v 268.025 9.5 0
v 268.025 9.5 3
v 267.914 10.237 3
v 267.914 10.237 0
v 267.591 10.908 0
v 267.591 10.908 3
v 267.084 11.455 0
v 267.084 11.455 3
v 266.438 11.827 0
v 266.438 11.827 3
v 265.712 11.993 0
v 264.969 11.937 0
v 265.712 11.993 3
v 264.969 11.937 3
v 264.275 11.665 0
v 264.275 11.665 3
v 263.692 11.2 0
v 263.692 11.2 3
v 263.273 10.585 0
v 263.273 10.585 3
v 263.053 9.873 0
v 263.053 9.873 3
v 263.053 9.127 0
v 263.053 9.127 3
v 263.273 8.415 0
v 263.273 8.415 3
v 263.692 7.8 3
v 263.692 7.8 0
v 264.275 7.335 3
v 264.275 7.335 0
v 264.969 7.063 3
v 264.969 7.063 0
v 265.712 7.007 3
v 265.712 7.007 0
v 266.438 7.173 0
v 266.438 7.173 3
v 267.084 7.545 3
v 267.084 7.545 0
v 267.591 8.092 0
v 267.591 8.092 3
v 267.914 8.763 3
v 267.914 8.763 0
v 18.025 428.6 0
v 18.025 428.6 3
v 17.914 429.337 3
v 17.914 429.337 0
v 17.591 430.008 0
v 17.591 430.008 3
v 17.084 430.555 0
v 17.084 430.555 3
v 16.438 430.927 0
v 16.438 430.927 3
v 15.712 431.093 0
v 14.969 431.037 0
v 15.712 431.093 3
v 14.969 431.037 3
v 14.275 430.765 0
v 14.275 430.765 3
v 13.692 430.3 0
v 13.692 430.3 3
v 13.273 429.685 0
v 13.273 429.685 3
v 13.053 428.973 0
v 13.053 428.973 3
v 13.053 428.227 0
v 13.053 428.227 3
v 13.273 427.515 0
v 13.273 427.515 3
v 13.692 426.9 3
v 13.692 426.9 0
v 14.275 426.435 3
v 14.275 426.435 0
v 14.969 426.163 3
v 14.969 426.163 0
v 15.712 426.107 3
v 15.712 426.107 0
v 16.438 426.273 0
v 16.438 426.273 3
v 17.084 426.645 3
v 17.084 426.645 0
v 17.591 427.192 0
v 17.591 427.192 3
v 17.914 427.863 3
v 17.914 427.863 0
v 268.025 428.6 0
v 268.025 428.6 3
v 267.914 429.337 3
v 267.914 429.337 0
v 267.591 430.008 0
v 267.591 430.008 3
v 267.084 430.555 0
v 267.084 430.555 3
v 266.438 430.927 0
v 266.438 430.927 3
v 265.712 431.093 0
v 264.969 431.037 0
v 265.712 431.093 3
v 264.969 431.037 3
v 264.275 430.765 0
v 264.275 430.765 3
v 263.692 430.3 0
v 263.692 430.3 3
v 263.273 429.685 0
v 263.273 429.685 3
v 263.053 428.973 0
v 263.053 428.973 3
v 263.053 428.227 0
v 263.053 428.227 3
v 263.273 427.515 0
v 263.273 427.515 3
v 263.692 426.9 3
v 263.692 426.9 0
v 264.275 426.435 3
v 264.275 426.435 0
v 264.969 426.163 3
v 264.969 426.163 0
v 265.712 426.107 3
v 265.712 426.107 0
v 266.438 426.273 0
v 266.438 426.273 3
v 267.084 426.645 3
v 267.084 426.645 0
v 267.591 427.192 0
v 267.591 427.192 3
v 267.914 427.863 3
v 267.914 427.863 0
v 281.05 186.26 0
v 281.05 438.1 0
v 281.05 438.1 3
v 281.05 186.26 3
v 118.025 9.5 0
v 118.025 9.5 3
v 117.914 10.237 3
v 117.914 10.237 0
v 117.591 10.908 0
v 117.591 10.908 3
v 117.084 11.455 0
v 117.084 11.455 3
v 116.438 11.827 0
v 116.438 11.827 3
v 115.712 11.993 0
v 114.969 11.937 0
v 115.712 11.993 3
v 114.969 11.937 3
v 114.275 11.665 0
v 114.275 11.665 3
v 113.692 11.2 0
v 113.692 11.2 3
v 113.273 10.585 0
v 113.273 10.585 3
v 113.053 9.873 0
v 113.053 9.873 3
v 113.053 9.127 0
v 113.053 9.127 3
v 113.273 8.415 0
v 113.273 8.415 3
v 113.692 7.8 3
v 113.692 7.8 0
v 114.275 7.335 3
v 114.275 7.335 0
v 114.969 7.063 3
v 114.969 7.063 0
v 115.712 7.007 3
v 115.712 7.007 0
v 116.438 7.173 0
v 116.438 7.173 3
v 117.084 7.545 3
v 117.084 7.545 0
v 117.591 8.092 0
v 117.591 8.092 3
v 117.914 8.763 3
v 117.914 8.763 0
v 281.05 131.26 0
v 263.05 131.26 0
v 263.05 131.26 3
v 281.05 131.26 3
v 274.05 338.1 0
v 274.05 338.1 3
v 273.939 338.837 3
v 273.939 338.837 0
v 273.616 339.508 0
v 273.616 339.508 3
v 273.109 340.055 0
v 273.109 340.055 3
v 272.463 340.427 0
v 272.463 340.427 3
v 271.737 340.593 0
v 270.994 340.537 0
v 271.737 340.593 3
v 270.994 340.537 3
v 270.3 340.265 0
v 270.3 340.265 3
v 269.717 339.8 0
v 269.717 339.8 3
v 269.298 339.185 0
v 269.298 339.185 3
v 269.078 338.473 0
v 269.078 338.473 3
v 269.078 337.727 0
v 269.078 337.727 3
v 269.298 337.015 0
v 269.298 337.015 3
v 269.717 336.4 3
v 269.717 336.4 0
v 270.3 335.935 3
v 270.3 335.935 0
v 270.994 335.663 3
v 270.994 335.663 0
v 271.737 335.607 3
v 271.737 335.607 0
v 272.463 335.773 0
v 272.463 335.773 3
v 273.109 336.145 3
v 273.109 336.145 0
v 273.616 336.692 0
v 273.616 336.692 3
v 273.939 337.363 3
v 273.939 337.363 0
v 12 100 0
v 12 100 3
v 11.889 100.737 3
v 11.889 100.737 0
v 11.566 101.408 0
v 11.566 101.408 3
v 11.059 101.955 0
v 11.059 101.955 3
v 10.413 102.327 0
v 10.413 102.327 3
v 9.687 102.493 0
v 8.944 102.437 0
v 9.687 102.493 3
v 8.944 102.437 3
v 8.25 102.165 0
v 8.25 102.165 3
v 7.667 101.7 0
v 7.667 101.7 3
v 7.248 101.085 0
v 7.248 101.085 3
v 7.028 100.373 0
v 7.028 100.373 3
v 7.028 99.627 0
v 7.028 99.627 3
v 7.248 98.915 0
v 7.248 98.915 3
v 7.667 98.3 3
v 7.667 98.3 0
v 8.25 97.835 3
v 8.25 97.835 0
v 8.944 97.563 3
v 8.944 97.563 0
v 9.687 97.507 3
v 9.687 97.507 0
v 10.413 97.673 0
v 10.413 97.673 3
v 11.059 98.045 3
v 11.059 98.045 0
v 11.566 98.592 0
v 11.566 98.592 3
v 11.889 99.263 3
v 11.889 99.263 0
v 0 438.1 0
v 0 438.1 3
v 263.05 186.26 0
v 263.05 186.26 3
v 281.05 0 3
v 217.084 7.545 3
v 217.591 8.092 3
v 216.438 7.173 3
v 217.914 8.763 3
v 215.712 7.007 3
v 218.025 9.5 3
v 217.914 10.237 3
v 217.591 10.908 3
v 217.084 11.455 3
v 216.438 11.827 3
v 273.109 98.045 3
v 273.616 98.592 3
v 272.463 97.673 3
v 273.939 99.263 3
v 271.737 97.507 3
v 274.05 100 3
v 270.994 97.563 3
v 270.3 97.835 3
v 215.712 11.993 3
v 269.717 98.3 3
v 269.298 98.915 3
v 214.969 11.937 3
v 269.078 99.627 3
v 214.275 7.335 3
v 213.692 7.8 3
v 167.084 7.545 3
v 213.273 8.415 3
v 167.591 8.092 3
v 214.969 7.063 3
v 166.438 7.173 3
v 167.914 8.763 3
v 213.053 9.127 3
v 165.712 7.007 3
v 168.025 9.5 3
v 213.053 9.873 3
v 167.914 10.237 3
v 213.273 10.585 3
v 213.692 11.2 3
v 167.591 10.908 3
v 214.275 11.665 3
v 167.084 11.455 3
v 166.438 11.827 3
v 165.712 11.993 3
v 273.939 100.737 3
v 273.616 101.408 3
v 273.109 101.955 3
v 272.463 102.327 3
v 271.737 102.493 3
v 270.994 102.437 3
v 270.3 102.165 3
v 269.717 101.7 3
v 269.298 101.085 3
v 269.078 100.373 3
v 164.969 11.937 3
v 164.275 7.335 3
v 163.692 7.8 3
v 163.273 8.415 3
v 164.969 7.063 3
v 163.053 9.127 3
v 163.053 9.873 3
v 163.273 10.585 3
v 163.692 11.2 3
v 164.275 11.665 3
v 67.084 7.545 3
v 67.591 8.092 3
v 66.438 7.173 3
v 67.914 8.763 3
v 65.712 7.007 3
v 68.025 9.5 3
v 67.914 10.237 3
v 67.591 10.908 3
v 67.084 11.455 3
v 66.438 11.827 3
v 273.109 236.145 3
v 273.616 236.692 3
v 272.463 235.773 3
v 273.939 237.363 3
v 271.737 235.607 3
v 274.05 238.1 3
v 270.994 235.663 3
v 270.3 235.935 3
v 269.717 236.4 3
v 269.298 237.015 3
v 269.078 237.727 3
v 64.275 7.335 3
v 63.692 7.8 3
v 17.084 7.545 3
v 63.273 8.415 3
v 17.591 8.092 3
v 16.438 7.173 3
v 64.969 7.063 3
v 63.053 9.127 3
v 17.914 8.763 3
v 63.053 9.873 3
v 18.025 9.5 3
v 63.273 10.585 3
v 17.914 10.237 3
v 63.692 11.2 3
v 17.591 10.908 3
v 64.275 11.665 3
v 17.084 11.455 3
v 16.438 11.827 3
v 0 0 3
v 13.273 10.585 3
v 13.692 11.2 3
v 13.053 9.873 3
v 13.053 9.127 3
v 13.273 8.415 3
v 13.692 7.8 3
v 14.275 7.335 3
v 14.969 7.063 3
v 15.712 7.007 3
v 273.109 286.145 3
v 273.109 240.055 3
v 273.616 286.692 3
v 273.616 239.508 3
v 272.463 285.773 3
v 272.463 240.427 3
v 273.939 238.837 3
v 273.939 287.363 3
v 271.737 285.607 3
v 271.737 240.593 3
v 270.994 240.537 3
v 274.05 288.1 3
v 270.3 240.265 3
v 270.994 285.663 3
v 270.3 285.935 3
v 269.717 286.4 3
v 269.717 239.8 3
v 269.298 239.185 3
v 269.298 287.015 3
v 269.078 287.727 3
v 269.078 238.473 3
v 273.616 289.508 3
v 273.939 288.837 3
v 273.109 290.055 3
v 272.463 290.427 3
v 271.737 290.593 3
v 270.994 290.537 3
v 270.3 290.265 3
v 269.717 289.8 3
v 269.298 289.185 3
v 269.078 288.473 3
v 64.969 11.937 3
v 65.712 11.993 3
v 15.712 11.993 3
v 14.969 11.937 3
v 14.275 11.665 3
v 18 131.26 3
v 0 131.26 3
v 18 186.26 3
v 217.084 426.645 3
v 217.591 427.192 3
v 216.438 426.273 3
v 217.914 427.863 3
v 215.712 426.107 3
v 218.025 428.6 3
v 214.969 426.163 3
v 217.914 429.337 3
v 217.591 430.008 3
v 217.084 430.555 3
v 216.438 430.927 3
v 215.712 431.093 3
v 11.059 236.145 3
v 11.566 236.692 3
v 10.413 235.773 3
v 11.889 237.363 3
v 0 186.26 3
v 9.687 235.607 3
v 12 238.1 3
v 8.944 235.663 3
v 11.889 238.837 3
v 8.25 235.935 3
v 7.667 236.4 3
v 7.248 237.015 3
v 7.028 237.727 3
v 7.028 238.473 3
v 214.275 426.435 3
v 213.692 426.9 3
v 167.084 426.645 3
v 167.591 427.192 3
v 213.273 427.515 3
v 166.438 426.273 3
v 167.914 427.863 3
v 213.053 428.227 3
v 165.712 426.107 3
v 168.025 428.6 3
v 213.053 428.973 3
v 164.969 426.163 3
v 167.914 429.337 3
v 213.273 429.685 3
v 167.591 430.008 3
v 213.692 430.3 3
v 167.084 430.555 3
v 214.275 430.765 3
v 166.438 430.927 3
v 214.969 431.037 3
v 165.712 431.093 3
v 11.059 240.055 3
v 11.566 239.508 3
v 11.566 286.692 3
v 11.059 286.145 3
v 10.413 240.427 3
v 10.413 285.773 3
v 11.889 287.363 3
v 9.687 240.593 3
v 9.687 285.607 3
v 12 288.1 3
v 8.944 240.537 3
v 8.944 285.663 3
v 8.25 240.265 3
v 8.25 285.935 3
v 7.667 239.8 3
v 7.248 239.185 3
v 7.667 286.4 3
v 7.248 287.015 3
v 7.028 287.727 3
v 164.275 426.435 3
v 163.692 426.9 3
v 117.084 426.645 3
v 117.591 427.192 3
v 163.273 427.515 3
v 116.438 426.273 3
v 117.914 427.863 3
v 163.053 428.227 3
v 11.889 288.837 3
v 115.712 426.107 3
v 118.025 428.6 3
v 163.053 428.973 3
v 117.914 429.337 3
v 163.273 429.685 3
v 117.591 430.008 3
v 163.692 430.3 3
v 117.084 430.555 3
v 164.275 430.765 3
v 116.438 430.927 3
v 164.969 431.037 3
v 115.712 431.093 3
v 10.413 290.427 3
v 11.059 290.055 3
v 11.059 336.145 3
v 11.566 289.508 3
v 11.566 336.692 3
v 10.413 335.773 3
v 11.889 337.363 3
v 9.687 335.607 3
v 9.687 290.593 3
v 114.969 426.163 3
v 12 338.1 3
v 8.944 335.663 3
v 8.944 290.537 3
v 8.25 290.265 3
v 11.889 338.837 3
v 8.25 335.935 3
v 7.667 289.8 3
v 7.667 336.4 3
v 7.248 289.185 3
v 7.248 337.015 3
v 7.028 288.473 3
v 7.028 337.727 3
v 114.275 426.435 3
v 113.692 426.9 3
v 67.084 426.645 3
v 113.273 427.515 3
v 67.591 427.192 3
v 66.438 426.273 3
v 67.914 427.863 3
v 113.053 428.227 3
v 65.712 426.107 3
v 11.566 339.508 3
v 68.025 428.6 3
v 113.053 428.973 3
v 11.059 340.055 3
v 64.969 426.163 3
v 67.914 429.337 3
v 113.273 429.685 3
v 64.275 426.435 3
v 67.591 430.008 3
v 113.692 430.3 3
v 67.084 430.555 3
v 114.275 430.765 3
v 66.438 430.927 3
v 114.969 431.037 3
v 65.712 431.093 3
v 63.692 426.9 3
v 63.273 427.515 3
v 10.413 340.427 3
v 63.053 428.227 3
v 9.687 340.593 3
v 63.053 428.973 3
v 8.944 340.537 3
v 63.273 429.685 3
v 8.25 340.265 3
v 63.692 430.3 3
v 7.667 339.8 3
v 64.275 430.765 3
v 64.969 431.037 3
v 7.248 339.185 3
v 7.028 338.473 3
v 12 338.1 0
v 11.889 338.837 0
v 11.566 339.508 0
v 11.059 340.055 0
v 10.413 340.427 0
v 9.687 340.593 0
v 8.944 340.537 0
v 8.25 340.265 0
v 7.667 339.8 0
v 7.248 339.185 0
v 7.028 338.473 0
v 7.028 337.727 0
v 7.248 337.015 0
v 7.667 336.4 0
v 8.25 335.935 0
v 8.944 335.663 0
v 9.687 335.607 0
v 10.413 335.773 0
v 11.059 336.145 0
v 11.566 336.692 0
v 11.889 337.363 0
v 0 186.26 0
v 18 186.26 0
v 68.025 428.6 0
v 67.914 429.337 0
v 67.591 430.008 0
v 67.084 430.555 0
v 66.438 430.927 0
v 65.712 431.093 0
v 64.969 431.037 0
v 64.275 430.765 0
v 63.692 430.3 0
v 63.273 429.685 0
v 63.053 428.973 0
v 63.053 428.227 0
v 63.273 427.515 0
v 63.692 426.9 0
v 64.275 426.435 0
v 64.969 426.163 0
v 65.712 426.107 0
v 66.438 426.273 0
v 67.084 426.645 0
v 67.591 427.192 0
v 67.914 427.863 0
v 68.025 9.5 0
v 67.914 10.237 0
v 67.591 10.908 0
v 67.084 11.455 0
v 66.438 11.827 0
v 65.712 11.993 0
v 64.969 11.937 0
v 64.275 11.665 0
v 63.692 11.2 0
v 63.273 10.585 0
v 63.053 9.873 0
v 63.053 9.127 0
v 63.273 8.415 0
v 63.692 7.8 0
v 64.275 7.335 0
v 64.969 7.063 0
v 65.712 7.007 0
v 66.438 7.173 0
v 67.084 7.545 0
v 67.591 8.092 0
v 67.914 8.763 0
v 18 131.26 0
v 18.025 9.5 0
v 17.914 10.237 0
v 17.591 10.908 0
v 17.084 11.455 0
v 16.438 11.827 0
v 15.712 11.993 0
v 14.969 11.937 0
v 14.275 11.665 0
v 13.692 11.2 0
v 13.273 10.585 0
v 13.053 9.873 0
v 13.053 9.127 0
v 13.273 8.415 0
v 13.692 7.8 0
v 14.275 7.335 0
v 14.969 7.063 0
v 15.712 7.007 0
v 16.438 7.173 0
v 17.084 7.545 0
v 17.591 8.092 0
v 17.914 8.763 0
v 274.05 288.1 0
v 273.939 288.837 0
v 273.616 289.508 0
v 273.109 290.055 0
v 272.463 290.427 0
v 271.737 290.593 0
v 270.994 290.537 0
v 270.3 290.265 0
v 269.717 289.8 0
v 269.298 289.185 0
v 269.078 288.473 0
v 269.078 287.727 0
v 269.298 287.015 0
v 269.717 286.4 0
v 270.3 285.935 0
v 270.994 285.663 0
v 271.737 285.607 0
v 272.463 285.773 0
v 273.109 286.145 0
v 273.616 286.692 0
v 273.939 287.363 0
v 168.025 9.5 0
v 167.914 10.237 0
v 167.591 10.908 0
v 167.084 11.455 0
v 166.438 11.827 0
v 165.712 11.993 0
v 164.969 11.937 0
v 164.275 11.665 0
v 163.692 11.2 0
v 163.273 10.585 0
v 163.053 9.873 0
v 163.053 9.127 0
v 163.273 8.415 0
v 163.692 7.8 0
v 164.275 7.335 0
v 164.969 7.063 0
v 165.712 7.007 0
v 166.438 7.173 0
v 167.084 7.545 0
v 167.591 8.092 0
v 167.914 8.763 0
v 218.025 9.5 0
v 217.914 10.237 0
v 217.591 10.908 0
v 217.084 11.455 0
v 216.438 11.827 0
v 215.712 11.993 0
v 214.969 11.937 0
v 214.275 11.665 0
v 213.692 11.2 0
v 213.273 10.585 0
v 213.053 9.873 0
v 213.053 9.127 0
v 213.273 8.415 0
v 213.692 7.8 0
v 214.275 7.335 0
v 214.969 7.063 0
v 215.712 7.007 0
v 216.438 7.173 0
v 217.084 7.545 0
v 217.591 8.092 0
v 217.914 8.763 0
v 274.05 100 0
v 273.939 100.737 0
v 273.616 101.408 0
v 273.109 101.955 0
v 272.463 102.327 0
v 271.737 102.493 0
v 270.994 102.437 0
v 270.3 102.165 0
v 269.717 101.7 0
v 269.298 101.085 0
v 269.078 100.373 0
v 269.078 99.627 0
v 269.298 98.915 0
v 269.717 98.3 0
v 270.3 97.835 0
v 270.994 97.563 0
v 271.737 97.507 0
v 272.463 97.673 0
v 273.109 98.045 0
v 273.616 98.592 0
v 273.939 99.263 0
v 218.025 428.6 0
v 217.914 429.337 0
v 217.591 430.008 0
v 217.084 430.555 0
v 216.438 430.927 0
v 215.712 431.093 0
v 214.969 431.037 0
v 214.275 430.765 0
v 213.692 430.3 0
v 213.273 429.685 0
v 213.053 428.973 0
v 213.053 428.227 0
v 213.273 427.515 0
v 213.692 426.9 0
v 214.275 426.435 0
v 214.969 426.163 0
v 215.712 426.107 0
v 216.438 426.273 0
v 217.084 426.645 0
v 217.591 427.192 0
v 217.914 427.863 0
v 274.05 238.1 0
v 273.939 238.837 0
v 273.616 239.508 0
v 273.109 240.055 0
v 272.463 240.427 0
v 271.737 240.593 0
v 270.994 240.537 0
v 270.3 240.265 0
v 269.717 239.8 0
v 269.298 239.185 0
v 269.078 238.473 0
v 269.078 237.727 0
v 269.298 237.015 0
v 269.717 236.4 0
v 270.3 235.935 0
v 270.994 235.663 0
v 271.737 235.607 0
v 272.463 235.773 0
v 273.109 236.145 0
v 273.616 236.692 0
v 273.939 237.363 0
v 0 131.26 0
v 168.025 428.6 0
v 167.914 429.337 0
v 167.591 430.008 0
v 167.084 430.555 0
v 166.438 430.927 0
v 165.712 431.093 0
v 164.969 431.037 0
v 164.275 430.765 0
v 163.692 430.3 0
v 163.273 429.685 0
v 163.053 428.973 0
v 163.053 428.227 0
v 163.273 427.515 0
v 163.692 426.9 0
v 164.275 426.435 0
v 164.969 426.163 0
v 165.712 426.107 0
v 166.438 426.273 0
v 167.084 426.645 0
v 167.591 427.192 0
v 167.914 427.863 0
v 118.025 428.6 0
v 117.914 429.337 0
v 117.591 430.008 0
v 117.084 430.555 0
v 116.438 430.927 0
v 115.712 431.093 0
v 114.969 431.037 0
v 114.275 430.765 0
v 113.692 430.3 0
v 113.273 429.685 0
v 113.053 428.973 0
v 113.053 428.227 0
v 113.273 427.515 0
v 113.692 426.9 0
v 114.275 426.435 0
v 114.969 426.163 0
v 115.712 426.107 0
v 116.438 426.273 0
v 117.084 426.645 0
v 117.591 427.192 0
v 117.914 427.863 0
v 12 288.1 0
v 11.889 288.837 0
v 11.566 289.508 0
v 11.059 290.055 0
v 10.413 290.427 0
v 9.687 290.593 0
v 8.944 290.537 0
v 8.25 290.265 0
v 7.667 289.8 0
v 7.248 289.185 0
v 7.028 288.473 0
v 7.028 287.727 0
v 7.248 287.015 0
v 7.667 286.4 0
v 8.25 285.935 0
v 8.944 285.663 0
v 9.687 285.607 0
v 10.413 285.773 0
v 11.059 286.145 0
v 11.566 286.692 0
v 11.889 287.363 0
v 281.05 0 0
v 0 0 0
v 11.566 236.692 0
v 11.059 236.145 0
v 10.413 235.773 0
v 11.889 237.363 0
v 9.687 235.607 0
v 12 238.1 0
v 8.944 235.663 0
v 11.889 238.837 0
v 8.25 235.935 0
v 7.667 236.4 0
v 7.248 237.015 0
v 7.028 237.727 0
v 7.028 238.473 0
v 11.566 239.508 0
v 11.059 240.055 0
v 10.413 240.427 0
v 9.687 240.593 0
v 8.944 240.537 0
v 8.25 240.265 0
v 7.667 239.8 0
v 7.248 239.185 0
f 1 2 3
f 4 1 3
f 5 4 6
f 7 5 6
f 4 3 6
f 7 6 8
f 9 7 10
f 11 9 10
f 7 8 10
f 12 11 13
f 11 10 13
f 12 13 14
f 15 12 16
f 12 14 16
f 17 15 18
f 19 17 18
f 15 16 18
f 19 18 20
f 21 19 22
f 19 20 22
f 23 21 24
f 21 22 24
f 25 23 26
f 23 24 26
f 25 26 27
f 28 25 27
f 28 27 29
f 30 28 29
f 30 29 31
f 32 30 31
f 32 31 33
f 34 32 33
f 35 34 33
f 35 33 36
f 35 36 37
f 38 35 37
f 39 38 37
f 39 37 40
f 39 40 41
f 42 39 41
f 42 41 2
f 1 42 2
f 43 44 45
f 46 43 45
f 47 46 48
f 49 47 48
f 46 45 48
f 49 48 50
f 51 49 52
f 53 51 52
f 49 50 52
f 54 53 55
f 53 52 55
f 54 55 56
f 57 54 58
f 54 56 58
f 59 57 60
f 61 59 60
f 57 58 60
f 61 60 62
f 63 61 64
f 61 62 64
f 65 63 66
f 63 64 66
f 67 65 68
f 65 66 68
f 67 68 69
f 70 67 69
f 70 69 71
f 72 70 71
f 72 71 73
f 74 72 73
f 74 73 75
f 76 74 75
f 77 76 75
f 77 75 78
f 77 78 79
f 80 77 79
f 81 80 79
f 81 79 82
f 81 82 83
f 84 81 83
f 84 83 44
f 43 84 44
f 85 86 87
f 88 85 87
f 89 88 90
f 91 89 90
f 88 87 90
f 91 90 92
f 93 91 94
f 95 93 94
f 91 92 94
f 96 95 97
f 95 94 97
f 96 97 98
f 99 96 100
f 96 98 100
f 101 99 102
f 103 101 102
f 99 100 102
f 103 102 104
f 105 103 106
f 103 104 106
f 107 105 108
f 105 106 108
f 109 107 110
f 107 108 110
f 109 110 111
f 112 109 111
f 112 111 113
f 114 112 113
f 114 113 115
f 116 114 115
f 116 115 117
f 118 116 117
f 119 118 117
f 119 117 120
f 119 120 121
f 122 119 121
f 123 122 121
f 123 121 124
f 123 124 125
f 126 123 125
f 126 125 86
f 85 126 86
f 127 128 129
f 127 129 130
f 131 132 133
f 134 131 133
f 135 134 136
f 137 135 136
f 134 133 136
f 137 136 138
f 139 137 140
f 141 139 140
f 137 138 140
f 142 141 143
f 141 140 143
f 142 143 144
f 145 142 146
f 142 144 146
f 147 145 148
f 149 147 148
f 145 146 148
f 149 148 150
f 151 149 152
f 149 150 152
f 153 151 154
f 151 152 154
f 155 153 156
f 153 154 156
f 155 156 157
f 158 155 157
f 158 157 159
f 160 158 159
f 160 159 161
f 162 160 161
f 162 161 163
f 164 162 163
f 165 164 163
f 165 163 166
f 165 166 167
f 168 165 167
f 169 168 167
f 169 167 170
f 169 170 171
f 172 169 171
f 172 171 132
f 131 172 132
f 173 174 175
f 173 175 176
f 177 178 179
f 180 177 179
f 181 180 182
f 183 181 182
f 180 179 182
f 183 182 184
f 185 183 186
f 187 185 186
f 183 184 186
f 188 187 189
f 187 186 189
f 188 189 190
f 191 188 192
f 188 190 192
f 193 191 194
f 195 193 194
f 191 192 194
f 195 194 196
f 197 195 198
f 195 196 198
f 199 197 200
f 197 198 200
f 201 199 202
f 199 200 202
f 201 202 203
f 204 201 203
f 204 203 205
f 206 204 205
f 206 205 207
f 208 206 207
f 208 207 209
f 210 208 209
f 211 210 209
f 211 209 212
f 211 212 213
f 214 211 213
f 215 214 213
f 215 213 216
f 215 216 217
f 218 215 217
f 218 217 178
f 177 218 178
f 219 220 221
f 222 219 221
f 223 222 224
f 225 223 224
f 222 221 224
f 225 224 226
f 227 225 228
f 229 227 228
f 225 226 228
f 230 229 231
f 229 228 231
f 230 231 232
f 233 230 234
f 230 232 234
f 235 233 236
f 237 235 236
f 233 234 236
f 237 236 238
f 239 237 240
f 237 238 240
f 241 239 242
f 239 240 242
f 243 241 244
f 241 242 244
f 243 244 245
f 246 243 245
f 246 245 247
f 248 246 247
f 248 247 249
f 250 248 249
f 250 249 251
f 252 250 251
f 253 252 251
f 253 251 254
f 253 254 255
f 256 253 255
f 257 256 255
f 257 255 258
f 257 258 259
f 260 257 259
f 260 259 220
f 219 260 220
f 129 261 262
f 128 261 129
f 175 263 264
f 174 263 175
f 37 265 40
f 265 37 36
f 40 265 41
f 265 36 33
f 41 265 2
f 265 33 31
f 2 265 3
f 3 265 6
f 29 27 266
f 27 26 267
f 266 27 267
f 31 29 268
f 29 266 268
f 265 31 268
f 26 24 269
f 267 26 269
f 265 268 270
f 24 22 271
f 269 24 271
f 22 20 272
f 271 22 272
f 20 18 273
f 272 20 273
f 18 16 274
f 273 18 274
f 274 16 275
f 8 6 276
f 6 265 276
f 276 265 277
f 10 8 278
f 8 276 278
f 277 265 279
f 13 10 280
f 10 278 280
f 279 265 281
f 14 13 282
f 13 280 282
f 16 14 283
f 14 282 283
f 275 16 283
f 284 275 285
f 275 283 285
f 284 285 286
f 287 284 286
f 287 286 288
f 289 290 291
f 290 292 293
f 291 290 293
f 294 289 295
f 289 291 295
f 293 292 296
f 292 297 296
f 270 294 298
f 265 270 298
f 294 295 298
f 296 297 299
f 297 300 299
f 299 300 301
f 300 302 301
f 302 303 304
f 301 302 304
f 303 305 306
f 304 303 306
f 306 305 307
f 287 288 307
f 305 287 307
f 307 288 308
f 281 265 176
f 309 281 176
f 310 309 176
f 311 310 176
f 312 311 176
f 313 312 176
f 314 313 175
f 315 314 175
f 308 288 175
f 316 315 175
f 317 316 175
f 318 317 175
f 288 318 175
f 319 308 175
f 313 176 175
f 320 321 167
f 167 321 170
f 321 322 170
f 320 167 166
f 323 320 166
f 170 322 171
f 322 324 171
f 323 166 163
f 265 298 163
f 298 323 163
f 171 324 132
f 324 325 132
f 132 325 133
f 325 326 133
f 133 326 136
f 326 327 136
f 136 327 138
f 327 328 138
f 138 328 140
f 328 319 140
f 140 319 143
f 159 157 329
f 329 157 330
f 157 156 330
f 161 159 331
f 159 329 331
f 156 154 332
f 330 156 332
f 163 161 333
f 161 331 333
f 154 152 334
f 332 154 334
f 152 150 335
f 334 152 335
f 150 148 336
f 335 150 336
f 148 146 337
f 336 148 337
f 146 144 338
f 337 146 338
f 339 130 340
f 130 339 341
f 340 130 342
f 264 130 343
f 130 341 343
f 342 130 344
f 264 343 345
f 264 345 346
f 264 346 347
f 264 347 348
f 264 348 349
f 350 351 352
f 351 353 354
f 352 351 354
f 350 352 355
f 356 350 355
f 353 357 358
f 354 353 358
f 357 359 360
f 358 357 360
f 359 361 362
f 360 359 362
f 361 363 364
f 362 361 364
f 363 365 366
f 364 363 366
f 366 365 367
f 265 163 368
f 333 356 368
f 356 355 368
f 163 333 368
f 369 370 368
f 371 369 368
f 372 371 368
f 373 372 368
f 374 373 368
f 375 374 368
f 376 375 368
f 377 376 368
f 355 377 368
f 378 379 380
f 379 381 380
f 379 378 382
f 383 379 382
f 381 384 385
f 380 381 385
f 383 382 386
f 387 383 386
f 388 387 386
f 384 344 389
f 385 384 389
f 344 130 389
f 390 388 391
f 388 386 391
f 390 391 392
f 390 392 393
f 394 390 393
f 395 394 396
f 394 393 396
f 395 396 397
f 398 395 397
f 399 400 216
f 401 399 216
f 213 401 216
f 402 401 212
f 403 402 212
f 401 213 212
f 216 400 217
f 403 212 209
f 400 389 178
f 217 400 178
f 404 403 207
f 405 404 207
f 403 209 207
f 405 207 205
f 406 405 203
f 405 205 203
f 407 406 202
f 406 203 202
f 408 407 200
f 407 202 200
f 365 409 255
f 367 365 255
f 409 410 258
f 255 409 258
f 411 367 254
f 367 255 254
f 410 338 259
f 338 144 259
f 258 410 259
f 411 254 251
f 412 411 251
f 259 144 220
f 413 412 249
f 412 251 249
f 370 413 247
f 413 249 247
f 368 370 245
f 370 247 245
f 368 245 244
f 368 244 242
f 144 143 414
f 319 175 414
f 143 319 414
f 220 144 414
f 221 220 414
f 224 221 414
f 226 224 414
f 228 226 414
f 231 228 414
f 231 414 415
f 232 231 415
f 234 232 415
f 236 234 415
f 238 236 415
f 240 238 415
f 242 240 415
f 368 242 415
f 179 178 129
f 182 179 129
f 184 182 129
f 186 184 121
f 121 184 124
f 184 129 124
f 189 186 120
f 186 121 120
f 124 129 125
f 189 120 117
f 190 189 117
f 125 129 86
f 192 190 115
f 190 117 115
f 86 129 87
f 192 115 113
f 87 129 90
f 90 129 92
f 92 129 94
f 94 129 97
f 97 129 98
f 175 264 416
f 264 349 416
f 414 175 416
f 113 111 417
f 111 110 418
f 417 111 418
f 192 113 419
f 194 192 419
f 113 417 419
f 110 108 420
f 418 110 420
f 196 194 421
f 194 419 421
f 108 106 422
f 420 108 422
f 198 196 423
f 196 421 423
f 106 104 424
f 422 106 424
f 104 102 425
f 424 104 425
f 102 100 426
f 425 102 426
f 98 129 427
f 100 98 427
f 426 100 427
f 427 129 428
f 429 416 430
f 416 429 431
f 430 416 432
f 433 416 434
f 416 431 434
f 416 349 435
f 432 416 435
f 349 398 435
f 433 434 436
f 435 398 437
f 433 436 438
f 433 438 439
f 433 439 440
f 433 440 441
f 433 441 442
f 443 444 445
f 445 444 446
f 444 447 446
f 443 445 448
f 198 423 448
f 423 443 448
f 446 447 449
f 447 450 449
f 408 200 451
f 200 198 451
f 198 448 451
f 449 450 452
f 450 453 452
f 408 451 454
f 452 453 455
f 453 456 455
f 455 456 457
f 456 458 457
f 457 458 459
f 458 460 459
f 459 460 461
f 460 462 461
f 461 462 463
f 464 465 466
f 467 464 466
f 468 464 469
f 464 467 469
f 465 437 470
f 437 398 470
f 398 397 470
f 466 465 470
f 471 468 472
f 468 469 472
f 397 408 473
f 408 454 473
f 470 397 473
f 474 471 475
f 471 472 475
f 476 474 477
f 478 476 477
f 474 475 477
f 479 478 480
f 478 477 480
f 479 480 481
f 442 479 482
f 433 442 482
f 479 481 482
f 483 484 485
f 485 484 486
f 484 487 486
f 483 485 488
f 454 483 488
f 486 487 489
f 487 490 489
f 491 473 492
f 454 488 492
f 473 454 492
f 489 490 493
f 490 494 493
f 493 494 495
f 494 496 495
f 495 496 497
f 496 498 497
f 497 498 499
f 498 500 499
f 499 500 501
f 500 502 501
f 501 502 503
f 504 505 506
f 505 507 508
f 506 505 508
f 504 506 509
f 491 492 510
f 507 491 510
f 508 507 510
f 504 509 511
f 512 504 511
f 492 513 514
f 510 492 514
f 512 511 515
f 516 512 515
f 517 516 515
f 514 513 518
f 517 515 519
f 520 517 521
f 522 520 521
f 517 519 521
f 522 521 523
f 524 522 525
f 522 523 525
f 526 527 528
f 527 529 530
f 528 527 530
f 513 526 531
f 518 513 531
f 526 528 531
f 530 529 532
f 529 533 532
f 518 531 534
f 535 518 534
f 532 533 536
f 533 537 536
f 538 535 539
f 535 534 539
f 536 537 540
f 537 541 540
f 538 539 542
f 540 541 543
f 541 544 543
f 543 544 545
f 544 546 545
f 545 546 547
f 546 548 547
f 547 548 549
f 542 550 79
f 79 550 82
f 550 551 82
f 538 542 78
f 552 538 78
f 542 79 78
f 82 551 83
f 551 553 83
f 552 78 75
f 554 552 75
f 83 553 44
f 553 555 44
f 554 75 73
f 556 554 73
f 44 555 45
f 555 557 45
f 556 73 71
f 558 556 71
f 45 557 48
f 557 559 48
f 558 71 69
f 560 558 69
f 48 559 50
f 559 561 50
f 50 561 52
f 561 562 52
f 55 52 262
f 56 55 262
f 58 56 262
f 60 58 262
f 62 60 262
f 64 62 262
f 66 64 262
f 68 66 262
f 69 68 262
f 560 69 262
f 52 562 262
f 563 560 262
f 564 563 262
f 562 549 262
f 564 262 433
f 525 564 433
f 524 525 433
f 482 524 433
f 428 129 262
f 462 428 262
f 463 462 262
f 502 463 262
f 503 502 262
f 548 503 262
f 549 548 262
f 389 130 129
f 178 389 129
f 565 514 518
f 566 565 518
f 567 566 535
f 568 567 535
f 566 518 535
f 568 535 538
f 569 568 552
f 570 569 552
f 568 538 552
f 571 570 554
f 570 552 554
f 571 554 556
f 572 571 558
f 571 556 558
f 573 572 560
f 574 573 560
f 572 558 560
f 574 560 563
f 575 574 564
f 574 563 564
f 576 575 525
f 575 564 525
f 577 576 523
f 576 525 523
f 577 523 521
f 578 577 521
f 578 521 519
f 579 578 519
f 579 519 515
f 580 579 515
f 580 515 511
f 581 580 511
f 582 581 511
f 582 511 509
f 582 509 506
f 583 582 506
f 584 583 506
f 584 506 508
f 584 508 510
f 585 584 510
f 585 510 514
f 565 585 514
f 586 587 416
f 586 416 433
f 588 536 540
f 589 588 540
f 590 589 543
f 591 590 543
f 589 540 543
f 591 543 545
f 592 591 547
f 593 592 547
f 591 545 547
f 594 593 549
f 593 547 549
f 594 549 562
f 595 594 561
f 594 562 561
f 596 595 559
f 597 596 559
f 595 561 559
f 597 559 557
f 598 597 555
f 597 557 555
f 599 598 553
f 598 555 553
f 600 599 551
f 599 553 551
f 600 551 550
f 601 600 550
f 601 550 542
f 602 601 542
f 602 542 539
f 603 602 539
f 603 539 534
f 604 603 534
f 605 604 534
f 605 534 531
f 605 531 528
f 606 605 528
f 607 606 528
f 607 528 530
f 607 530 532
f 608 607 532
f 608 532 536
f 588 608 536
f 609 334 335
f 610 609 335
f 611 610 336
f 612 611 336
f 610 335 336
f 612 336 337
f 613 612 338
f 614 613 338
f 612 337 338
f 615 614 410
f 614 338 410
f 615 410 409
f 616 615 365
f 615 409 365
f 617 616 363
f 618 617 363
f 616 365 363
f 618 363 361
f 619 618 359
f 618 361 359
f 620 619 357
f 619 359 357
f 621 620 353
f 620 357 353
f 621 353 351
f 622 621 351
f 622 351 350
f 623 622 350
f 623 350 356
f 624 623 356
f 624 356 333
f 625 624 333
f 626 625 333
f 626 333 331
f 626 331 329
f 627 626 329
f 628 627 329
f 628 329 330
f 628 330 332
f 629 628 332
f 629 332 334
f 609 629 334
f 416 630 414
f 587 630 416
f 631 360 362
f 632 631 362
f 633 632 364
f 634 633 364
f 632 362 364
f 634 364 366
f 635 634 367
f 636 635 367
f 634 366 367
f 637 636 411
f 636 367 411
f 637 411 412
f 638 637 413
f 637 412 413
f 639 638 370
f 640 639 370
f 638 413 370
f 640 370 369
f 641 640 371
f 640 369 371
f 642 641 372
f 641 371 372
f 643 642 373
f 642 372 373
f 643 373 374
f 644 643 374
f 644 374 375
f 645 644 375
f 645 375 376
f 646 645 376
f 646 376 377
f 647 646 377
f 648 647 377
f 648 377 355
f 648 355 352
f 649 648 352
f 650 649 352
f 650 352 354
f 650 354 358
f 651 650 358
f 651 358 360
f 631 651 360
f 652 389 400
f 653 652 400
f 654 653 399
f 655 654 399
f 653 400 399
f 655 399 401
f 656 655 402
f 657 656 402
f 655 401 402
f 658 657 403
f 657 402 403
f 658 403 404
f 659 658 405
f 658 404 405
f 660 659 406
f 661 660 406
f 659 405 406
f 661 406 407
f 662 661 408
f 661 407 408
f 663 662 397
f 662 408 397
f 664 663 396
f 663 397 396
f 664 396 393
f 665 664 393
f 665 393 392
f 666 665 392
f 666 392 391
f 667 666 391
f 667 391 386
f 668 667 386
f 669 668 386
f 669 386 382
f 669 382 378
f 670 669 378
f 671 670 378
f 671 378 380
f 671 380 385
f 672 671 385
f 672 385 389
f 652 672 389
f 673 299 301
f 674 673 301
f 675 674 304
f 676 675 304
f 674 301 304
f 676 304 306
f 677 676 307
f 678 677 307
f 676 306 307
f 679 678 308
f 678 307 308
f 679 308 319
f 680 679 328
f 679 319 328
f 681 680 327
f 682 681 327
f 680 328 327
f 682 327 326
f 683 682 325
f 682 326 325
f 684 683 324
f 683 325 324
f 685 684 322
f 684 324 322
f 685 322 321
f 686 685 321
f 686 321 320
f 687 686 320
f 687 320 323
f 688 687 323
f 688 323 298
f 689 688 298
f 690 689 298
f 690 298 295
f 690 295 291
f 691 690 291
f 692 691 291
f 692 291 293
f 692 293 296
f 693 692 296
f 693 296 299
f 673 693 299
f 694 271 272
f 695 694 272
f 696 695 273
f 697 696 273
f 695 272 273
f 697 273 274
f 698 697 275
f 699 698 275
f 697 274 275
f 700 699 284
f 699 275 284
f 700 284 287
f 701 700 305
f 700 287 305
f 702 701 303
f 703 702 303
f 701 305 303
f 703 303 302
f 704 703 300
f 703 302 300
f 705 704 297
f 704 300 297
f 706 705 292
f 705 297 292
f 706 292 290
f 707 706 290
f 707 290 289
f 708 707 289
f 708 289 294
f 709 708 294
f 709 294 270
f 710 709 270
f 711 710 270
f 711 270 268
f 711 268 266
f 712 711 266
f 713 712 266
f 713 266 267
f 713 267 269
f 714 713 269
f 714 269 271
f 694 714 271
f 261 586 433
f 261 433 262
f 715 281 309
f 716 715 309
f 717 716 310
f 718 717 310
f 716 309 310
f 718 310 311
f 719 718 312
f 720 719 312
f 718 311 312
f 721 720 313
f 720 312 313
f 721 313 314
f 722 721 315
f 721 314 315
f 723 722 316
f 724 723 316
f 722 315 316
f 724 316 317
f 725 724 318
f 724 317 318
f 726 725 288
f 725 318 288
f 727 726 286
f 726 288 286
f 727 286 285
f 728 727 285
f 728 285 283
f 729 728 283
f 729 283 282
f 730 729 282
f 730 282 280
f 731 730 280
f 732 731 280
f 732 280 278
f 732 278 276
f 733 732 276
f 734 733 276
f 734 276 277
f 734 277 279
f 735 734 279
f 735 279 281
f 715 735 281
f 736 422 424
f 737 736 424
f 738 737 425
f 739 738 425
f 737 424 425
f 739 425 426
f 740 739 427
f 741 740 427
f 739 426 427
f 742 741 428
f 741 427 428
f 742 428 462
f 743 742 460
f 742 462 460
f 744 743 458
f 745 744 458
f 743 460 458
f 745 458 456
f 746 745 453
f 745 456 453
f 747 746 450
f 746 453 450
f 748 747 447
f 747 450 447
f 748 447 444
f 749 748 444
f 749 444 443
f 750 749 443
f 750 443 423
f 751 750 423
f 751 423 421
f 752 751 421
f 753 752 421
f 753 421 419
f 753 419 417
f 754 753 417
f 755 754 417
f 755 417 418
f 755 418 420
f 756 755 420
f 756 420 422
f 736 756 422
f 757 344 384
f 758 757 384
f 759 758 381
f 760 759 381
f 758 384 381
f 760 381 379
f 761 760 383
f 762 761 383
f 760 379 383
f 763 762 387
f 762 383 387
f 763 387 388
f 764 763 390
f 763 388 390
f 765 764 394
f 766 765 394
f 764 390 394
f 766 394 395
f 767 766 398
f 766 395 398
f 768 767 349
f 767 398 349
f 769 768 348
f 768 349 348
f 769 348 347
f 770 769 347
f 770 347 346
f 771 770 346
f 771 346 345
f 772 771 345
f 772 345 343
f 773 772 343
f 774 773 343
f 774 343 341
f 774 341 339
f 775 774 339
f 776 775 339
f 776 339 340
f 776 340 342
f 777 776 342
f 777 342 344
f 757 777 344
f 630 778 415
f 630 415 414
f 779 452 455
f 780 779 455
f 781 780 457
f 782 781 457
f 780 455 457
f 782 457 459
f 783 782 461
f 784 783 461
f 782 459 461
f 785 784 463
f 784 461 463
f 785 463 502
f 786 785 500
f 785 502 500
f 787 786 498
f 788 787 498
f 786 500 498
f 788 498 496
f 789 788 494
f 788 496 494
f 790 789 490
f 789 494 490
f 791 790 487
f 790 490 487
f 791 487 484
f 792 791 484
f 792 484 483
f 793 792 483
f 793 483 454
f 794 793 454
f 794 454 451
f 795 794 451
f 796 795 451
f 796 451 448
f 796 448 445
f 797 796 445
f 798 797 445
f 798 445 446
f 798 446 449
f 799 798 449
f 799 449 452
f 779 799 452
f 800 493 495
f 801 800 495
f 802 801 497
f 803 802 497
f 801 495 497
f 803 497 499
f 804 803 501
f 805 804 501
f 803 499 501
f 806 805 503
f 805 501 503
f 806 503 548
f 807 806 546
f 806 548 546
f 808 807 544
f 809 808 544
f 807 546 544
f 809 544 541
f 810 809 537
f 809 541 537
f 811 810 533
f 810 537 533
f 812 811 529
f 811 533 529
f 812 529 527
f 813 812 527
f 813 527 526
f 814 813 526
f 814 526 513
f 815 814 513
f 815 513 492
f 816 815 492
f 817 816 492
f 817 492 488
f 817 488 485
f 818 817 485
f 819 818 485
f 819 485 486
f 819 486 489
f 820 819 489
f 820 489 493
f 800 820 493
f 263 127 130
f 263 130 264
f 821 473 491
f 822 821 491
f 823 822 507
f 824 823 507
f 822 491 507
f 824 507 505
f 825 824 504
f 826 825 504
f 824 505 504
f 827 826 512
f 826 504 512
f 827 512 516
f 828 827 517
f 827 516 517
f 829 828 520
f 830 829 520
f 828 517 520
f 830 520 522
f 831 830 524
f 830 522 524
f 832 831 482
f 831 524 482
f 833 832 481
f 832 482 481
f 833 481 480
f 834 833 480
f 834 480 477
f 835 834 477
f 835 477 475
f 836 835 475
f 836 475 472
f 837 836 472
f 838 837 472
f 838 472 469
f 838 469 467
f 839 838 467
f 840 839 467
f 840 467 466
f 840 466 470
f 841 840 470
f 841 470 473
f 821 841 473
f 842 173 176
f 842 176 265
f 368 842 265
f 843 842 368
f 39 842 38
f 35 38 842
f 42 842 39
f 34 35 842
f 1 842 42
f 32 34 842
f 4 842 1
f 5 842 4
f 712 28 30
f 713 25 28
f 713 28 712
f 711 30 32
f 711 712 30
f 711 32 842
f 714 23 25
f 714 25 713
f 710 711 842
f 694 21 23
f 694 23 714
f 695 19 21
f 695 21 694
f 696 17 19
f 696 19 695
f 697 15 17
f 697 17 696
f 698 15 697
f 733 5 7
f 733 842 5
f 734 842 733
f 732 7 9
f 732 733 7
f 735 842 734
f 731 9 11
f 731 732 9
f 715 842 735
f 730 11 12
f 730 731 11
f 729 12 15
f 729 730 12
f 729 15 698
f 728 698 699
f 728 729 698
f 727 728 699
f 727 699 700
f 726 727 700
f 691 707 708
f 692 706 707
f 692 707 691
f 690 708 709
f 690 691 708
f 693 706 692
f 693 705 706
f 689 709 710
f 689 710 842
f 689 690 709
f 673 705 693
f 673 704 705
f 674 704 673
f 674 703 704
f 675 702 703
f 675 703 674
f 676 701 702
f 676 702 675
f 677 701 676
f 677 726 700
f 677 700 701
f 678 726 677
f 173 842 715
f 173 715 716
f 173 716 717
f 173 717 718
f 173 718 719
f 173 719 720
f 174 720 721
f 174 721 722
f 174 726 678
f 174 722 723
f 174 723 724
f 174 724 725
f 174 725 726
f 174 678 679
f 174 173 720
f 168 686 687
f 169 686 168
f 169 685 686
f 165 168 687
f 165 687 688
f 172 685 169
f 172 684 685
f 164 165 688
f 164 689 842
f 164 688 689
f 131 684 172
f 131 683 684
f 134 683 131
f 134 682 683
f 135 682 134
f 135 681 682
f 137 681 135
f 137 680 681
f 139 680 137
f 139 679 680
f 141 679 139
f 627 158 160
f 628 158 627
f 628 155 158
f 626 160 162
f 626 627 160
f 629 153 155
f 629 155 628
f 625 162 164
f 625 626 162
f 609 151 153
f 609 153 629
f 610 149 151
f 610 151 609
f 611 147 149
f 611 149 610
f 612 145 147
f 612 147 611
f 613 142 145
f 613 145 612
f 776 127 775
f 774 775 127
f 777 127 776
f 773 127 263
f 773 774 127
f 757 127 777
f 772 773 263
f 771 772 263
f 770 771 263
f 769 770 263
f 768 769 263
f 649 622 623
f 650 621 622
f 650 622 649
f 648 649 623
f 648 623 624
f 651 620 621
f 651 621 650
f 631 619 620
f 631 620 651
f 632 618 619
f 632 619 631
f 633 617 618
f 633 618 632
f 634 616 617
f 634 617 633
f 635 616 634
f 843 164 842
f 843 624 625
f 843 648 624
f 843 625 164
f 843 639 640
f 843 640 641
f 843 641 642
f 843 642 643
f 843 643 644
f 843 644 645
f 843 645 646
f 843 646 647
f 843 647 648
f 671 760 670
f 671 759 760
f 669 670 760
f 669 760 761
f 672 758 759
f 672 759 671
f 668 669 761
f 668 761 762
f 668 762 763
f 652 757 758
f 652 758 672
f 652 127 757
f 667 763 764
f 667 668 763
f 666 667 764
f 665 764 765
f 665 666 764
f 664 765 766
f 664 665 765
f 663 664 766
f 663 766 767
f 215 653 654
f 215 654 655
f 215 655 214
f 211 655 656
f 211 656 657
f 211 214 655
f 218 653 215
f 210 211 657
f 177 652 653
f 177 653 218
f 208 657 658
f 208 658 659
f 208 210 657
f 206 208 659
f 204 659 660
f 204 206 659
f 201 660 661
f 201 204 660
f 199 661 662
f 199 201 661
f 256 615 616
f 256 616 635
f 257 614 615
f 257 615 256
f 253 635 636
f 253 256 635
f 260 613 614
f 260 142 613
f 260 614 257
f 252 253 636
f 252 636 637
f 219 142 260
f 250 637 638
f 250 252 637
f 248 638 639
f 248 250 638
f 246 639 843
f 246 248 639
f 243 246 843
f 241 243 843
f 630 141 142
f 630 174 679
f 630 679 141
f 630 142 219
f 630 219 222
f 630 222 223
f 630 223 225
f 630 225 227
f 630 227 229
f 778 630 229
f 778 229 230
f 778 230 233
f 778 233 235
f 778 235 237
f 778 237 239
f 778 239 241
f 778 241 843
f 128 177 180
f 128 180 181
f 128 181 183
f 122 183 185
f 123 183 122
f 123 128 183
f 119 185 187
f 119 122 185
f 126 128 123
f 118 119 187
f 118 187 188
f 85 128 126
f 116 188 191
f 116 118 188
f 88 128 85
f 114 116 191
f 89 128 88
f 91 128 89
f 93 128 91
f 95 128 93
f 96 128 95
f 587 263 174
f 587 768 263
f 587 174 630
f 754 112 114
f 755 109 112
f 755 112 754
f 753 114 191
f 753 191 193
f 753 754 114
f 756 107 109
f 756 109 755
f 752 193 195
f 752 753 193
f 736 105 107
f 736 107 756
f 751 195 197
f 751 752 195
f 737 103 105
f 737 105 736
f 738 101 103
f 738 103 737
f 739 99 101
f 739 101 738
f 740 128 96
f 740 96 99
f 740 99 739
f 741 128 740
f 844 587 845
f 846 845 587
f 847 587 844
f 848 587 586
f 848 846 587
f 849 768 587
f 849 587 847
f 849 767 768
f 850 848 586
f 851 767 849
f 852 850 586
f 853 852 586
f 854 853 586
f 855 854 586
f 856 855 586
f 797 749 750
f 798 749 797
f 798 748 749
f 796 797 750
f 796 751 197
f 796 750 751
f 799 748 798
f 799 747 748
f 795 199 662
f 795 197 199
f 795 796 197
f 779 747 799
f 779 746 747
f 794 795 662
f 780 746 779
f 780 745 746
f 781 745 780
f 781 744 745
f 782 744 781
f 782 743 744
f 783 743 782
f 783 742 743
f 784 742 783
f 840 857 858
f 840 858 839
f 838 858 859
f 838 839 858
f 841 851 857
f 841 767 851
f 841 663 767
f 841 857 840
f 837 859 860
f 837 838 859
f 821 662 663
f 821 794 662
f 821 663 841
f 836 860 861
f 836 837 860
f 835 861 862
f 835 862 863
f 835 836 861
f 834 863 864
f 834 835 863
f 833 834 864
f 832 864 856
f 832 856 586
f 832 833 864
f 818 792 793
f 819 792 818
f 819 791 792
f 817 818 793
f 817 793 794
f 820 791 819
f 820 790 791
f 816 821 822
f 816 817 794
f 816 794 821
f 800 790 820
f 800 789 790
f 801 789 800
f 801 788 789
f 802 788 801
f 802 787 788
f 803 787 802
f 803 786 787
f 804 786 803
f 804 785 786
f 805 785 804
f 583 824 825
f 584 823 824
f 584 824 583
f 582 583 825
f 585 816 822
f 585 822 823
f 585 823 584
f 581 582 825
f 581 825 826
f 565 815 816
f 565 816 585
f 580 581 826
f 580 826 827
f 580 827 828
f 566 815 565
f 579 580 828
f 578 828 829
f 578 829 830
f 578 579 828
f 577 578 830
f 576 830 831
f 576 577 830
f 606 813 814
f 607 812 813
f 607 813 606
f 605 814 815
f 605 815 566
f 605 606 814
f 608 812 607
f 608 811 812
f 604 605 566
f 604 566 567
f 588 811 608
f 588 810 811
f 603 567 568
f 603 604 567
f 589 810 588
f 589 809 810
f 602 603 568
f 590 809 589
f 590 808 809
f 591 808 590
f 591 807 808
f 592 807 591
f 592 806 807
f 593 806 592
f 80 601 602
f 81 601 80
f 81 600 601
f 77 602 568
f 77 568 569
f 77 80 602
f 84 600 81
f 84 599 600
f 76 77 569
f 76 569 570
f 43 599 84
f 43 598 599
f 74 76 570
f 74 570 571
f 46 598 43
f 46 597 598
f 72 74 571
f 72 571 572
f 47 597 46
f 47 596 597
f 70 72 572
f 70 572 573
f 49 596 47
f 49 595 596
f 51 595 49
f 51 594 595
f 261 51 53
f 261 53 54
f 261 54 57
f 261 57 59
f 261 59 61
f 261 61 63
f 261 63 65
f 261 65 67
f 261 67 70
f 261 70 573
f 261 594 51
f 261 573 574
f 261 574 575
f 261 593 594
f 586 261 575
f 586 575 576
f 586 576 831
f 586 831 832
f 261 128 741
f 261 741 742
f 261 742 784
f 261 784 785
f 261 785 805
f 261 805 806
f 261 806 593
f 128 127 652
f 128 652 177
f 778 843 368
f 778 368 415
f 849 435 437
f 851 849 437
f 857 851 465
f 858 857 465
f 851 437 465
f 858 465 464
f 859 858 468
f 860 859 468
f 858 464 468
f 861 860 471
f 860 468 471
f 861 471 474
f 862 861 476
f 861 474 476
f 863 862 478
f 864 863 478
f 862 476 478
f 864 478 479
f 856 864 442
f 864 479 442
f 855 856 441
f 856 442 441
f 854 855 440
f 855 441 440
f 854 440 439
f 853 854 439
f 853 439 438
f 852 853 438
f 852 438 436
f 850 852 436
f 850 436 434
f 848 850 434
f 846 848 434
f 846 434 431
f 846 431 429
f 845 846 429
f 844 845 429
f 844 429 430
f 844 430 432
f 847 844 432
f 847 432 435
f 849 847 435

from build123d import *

# Parameters (mm, degrees)
BOSS_EXTRUDE1_DEPTH = 3
SKETCH3_R           = 2.5
CUT_EXTRUDE1_DEPTH  = 4


with BuildPart() as part:
    # Sketch1 → Boss-Extrude1 (new body)
    with BuildSketch(Plane.XY):
        Polygon((0, 186.26), (0, 438.1), (281.05, 438.1), (281.05, 186.26), (263.05, 186.26), (263.05, 131.26), (281.05, 131.26), (281.05, 0), (0, 0), (0, 131.26), (18, 131.26), (18, 186.26), align=None)
    extrude(amount=BOSS_EXTRUDE1_DEPTH)

    # Sketch3 → Cut-Extrude1 (cut, through all)
    with BuildSketch(Plane.XY.offset(3)):
        with Locations((65.525, 428.6)):
            Circle(SKETCH3_R)
        with Locations((115.525, 428.6)):
            Circle(SKETCH3_R)
        with Locations((15.525, 428.6)):
            Circle(SKETCH3_R)
        with Locations((265.525, 428.6)):
            Circle(SKETCH3_R)
        with Locations((165.525, 428.6)):
            Circle(SKETCH3_R)
        with Locations((215.525, 428.6)):
            Circle(SKETCH3_R)
        with Locations((215.525, 9.5)):
            Circle(SKETCH3_R)
        with Locations((165.525, 9.5)):
            Circle(SKETCH3_R)
        with Locations((265.525, 9.5)):
            Circle(SKETCH3_R)
        with Locations((15.525, 9.5)):
            Circle(SKETCH3_R)
        with Locations((115.525, 9.5)):
            Circle(SKETCH3_R)
        with Locations((65.525, 9.5)):
            Circle(SKETCH3_R)
        with Locations((9.5, 338.1)):
            Circle(SKETCH3_R)
        with Locations((9.5, 288.1)):
            Circle(SKETCH3_R)
        with Locations((9.5, 238.1)):
            Circle(SKETCH3_R)
        with Locations((9.5, 100)):
            Circle(SKETCH3_R)
        with Locations((271.55, 100)):
            Circle(SKETCH3_R)
        with Locations((271.55, 238.1)):
            Circle(SKETCH3_R)
        with Locations((271.55, 288.1)):
            Circle(SKETCH3_R)
        with Locations((271.55, 338.1)):
            Circle(SKETCH3_R)
    extrude(amount=-CUT_EXTRUDE1_DEPTH, mode=Mode.SUBTRACT)


solid = part.part
